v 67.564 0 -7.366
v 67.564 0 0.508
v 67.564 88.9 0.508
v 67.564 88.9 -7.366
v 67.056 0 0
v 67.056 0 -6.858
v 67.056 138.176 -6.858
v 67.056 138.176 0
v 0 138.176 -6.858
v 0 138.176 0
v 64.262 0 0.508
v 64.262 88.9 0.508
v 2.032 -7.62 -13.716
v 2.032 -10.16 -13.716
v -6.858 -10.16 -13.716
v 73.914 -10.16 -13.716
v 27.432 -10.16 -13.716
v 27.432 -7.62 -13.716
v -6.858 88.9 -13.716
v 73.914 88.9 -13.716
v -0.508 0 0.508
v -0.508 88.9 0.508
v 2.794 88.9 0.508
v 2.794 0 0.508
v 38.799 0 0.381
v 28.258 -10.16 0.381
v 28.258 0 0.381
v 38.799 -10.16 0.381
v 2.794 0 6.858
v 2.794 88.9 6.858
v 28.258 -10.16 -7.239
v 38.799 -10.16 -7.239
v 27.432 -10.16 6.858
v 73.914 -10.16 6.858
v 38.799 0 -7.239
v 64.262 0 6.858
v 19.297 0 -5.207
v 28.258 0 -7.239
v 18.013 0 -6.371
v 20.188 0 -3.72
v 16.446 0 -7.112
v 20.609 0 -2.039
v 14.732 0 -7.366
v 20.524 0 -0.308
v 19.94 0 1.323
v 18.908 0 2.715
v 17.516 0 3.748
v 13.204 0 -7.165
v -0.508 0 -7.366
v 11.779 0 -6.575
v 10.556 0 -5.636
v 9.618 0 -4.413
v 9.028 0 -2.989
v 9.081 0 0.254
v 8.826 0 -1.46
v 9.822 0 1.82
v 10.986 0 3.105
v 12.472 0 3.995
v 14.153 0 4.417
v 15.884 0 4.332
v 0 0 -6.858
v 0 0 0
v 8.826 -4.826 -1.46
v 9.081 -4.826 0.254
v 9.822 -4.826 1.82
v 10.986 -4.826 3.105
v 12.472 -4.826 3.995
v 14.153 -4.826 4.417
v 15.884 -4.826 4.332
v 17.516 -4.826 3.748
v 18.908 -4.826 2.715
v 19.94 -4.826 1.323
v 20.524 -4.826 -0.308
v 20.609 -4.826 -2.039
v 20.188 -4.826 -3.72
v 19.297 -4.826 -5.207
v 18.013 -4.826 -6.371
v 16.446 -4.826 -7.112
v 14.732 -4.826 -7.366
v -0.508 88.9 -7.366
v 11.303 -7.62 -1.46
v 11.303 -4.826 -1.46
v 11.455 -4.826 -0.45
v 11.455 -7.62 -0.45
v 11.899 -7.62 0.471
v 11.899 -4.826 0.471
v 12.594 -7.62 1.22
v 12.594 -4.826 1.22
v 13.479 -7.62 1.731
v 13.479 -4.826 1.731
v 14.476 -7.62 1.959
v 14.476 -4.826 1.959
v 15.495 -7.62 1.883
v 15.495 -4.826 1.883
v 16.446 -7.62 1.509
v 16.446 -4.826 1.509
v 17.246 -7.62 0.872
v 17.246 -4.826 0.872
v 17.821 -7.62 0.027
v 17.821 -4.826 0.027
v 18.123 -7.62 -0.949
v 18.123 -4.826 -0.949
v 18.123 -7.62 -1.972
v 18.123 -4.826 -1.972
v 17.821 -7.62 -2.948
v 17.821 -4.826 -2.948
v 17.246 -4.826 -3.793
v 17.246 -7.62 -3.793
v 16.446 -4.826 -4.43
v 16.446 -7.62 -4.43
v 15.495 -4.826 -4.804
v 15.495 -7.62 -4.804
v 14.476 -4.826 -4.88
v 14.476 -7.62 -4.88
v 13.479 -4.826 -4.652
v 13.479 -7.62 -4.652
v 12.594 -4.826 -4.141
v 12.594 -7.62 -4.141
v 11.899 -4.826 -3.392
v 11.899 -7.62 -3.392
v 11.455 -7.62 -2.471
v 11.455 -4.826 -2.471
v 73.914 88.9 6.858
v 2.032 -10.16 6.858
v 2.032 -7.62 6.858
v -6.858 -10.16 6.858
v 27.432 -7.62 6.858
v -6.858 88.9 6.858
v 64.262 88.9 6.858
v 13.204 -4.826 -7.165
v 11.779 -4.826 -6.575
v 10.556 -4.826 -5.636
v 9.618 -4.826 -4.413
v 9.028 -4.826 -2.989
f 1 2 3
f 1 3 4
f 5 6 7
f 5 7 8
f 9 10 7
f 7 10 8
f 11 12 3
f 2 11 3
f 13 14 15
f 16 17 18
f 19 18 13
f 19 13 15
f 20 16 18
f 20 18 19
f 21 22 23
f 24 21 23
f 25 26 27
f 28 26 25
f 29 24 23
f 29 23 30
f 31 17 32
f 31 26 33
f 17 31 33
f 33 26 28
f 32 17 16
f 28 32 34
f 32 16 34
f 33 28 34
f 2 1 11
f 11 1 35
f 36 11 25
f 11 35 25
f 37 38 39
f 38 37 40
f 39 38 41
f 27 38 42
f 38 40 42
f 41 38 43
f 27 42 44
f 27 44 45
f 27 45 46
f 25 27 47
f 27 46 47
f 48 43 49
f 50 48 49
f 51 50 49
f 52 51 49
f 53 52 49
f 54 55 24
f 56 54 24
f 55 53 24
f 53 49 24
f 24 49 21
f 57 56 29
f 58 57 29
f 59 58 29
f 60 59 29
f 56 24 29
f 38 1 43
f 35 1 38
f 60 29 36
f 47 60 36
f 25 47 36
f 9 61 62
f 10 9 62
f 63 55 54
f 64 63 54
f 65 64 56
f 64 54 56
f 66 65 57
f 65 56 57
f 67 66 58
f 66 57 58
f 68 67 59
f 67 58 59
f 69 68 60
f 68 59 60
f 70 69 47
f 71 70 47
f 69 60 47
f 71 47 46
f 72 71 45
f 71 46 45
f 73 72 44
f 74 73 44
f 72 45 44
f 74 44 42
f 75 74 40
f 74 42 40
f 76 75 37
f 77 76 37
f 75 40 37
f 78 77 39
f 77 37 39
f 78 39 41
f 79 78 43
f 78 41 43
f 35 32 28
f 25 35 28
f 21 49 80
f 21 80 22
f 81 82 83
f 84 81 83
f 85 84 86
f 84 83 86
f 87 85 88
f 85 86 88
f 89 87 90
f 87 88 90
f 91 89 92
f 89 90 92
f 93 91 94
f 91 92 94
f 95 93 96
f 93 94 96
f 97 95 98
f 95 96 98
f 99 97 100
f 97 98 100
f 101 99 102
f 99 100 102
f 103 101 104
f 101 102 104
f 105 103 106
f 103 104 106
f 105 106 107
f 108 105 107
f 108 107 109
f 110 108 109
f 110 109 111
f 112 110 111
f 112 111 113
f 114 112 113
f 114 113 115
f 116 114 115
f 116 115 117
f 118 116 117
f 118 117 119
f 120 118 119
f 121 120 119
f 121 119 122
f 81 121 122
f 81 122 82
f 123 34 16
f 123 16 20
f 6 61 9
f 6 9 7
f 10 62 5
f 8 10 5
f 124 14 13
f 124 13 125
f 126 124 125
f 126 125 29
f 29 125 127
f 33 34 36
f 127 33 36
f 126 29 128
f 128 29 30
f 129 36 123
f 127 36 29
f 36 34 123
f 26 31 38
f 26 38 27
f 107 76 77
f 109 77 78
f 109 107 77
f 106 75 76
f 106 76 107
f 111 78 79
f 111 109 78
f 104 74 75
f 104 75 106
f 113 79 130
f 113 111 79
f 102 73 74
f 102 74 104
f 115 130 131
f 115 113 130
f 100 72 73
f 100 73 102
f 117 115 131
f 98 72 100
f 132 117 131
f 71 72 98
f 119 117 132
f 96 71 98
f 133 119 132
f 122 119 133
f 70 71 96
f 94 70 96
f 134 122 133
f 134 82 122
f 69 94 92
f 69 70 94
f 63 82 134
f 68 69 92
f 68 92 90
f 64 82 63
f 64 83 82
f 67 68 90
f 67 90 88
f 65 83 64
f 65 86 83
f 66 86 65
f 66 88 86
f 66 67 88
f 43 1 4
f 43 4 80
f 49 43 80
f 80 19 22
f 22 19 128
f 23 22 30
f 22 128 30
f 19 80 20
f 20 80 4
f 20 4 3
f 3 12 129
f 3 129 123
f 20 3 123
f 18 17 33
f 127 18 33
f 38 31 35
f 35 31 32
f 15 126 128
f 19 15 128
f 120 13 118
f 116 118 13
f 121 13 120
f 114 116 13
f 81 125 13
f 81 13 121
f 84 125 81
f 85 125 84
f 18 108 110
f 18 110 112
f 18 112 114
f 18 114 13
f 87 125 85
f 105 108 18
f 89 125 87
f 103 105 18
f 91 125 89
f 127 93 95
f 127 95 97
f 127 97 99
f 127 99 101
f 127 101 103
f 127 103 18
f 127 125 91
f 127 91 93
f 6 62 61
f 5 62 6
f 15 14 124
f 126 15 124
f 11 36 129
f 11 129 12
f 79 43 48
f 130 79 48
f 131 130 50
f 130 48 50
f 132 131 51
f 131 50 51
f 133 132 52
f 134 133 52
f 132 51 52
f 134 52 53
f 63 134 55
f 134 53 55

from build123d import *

# Parameters (mm, degrees)
F0_W          = 67.056
F0_H          = 6.858
F1_DEPTH      = 138.176
F3_DEPTH      = 88.9
F4_W          = 10.16
F4_H          = 20.574
F5_DEPTH      = 73.914
F5_DEPTH_BACK = 6.858
F6_W          = 10.541
F6_H          = 7.62
F7_DEPTH      = 148.337
F8_R          = 3.429
F9_DEPTH      = 10.161
F10_DEPTH     = 4.826
F11_W         = 25.4
F11_H         = 20.574
F11_R         = 3.429
F12_DEPTH     = 2.54


with BuildPart() as f1:
    # F0 (on Front) → F1 (new body)
    with BuildSketch(Plane.XZ):
        with Locations((33.528, -3.429)):
            Rectangle(F0_W, F0_H)
    extrude(amount=-F1_DEPTH)


with BuildPart() as f3:
    # F2 (on face) → F3 (new body)
    with BuildSketch(Plane.XZ):
        Polygon((-0.508, -7.366), (-0.508, 0), (-0.508, 0.508), (2.794, 0.508), (2.794, 6.858), (-6.858, 6.858), (-6.858, -13.716), (73.914, -13.716), (73.914, 6.858), (64.262, 6.858), (64.262, 0.508), (67.564, 0.508), (67.564, 0), (67.564, -7.366), align=None)
    extrude(amount=-F3_DEPTH)

    # F4 (on Right) → F5 (join, two sides)
    with BuildSketch(Plane.YZ) as f5_sk:
        with Locations((-5.08, -3.429)):
            Rectangle(F4_W, F4_H)
    extrude(amount=F5_DEPTH)
    extrude(f5_sk.sketch, amount=-F5_DEPTH_BACK)

    # F6 (on face) → F7 (cut, through all)
    with BuildSketch(Plane.XZ.offset(10.16)):
        with Locations((33.5280000003, -3.429)):
            Rectangle(F6_W, F6_H)
    extrude(amount=-F7_DEPTH, mode=Mode.SUBTRACT)

    # F8 (on face) → F9 (cut, through all)
    with BuildSketch(Plane(origin=(0, 0, 0), x_dir=(-1, 0, 0), z_dir=(0, 1, 0))):
        with Locations((-14.732, -1.4605)):
            Circle(F8_R)
    extrude(amount=-F9_DEPTH, mode=Mode.SUBTRACT)

    # F8 (on face) → F10 (cut)
    with BuildSketch(Plane(origin=(0, 0, 0), x_dir=(-1, 0, 0), z_dir=(0, 1, 0))):
        with BuildLine():
            ThreePointArc((-14.732000012, -7.366), (-10.5561809079, -5.6363191005), (-8.8265, -1.4605))
            ThreePointArc((-8.8265, -1.4605), (-18.9078190921, 2.7153191005), (-14.732000012, -7.366))
        make_face()
        with Locations((-14.732, -1.4605)):
            Circle(F8_R, mode=Mode.SUBTRACT)
    extrude(amount=-F10_DEPTH, mode=Mode.SUBTRACT)

    # F11 (on face) → F12 (cut)
    with BuildSketch(Plane.XZ.offset(10.16)):
        with Locations((14.732, -3.429)):
            Rectangle(F11_W, F11_H)
        with Locations((14.732, -1.4605)):
            Circle(F11_R, mode=Mode.SUBTRACT)
    extrude(amount=-F12_DEPTH, mode=Mode.SUBTRACT)


solid = Compound([f1.part, f3.part])
